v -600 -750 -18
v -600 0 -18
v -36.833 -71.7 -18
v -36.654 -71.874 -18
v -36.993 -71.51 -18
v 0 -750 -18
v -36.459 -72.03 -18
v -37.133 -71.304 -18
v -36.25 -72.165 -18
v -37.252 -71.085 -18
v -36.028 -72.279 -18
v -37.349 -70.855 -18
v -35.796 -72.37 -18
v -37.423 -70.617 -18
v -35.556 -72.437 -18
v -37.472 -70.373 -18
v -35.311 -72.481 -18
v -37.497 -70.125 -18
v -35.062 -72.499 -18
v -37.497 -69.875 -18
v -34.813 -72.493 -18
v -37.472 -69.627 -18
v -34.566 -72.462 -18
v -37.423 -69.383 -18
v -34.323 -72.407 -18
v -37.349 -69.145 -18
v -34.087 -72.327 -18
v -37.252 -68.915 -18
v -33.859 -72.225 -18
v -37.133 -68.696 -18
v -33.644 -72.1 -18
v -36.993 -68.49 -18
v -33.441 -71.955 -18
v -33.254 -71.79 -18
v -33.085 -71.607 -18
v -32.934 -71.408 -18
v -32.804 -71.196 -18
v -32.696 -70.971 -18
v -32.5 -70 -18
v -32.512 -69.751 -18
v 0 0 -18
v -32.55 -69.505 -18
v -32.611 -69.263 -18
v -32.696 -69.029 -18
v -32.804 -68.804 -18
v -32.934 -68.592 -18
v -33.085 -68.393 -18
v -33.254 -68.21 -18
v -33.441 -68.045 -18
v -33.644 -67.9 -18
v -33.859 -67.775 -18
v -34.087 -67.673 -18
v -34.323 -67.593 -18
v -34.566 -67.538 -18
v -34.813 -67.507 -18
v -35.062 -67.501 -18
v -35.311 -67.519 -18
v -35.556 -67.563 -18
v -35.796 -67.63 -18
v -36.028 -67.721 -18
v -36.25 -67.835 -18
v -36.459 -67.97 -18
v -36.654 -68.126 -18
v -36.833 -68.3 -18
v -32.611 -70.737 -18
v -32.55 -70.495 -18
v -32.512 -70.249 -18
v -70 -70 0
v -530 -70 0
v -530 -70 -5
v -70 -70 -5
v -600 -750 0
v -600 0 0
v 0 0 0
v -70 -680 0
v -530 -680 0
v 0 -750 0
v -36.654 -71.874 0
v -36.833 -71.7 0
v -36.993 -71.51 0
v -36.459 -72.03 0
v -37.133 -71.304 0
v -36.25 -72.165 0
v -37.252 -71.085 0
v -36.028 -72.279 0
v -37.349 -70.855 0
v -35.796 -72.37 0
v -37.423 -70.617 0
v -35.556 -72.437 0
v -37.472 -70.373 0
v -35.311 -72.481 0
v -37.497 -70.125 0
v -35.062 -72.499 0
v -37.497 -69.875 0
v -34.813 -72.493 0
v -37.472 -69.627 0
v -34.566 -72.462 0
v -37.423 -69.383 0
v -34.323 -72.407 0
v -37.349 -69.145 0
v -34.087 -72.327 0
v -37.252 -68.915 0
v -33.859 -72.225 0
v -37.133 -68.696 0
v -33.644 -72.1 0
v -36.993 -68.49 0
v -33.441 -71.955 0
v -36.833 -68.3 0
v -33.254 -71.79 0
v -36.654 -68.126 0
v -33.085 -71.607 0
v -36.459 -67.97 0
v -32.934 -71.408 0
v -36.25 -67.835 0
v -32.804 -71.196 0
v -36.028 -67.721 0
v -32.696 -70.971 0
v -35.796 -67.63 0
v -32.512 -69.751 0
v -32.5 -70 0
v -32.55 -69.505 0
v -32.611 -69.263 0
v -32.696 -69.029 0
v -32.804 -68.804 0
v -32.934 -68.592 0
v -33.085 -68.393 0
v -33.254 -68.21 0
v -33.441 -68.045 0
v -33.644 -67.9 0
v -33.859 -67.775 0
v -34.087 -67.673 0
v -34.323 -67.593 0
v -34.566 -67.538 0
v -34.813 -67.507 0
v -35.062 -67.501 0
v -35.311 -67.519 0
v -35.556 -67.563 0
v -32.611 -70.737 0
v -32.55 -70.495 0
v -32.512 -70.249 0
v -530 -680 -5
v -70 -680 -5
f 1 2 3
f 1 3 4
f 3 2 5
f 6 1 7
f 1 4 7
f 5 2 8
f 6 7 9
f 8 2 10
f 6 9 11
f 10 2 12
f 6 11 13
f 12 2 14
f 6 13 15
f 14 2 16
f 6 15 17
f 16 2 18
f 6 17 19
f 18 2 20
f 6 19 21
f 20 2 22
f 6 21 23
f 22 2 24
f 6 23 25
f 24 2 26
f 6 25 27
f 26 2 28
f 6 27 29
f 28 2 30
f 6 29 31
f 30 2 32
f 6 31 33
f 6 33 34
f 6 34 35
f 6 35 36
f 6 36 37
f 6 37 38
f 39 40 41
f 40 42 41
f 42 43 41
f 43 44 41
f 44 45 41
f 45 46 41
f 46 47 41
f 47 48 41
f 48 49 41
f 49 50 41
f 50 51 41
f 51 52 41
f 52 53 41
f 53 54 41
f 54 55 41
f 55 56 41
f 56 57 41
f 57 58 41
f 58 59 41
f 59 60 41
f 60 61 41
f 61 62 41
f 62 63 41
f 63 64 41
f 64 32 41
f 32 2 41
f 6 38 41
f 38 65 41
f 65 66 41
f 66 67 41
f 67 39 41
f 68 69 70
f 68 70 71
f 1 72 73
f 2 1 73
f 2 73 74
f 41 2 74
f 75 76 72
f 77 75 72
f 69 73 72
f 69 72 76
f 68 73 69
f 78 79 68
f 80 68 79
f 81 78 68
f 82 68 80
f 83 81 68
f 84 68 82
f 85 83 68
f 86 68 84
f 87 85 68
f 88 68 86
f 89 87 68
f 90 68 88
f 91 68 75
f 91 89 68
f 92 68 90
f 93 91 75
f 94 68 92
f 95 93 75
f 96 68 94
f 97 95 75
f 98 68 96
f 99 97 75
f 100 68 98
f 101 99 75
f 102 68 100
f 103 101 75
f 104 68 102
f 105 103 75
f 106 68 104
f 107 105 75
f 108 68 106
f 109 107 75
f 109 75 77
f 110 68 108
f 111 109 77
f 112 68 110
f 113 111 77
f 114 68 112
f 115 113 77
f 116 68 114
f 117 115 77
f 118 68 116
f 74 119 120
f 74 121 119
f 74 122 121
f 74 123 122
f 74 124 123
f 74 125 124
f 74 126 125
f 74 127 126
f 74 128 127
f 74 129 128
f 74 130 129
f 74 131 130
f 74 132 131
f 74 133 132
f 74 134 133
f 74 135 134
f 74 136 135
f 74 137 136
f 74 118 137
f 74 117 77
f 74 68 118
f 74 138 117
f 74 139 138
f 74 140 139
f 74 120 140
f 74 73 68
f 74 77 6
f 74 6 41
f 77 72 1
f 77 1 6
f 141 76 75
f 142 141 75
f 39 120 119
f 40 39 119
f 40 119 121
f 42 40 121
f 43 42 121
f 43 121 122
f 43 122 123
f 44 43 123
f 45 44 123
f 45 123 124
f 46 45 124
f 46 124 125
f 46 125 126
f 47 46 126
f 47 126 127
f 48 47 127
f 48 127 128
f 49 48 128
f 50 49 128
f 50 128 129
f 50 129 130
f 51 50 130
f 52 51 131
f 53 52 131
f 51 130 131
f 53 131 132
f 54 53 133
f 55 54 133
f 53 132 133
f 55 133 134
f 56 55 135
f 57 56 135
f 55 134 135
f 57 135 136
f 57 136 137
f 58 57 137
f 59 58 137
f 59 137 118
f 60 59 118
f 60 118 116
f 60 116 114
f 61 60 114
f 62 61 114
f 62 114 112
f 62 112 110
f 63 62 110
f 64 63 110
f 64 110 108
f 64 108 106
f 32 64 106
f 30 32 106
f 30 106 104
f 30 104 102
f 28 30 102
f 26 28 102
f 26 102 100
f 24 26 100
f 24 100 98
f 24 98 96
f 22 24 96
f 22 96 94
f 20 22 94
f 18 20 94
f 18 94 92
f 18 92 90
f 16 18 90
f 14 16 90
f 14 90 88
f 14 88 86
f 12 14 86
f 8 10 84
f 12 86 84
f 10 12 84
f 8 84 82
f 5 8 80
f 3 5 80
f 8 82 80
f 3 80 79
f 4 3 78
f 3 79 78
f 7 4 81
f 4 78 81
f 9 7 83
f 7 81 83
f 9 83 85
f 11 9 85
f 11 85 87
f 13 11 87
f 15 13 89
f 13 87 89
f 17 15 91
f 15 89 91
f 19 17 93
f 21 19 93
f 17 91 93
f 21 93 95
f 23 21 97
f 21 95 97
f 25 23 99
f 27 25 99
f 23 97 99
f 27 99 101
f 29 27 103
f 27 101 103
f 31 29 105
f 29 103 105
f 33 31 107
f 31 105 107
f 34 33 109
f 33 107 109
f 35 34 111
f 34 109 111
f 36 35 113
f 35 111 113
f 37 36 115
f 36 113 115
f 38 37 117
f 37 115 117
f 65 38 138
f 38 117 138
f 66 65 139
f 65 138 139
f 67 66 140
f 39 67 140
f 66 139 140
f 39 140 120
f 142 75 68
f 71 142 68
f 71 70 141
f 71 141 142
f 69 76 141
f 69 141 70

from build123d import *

# Parameters (mm, degrees)
SCHIZZO1_W         = 600
SCHIZZO1_H         = 750
PANNELLO_DEPTH     = 18
SCHIZZO2_R         = 2.5
FOROMANIGLIA_DEPTH = 961.637288471
SCHIZZO3_W         = 460
SCHIZZO3_H         = 610
LAVORAZIONE_DEPTH  = 5


with BuildPart() as part:
    # Schizzo1 → Pannello (new body)
    with BuildSketch(Plane.XY):
        with Locations((-300, -375)):
            Rectangle(SCHIZZO1_W, SCHIZZO1_H)
    extrude(amount=-PANNELLO_DEPTH)

    # Schizzo2 → ForoManiglia (cut, through all)
    with BuildSketch(Plane.XY):
        with Locations((-35, -70)):
            Circle(SCHIZZO2_R)
    extrude(amount=-FOROMANIGLIA_DEPTH, mode=Mode.SUBTRACT)

    # Schizzo3 → Lavorazione (cut)
    with BuildSketch(Plane.XY):
        with Locations((-300, -375)):
            Rectangle(SCHIZZO3_W, SCHIZZO3_H)
    extrude(amount=-LAVORAZIONE_DEPTH, mode=Mode.SUBTRACT)


solid = part.part
